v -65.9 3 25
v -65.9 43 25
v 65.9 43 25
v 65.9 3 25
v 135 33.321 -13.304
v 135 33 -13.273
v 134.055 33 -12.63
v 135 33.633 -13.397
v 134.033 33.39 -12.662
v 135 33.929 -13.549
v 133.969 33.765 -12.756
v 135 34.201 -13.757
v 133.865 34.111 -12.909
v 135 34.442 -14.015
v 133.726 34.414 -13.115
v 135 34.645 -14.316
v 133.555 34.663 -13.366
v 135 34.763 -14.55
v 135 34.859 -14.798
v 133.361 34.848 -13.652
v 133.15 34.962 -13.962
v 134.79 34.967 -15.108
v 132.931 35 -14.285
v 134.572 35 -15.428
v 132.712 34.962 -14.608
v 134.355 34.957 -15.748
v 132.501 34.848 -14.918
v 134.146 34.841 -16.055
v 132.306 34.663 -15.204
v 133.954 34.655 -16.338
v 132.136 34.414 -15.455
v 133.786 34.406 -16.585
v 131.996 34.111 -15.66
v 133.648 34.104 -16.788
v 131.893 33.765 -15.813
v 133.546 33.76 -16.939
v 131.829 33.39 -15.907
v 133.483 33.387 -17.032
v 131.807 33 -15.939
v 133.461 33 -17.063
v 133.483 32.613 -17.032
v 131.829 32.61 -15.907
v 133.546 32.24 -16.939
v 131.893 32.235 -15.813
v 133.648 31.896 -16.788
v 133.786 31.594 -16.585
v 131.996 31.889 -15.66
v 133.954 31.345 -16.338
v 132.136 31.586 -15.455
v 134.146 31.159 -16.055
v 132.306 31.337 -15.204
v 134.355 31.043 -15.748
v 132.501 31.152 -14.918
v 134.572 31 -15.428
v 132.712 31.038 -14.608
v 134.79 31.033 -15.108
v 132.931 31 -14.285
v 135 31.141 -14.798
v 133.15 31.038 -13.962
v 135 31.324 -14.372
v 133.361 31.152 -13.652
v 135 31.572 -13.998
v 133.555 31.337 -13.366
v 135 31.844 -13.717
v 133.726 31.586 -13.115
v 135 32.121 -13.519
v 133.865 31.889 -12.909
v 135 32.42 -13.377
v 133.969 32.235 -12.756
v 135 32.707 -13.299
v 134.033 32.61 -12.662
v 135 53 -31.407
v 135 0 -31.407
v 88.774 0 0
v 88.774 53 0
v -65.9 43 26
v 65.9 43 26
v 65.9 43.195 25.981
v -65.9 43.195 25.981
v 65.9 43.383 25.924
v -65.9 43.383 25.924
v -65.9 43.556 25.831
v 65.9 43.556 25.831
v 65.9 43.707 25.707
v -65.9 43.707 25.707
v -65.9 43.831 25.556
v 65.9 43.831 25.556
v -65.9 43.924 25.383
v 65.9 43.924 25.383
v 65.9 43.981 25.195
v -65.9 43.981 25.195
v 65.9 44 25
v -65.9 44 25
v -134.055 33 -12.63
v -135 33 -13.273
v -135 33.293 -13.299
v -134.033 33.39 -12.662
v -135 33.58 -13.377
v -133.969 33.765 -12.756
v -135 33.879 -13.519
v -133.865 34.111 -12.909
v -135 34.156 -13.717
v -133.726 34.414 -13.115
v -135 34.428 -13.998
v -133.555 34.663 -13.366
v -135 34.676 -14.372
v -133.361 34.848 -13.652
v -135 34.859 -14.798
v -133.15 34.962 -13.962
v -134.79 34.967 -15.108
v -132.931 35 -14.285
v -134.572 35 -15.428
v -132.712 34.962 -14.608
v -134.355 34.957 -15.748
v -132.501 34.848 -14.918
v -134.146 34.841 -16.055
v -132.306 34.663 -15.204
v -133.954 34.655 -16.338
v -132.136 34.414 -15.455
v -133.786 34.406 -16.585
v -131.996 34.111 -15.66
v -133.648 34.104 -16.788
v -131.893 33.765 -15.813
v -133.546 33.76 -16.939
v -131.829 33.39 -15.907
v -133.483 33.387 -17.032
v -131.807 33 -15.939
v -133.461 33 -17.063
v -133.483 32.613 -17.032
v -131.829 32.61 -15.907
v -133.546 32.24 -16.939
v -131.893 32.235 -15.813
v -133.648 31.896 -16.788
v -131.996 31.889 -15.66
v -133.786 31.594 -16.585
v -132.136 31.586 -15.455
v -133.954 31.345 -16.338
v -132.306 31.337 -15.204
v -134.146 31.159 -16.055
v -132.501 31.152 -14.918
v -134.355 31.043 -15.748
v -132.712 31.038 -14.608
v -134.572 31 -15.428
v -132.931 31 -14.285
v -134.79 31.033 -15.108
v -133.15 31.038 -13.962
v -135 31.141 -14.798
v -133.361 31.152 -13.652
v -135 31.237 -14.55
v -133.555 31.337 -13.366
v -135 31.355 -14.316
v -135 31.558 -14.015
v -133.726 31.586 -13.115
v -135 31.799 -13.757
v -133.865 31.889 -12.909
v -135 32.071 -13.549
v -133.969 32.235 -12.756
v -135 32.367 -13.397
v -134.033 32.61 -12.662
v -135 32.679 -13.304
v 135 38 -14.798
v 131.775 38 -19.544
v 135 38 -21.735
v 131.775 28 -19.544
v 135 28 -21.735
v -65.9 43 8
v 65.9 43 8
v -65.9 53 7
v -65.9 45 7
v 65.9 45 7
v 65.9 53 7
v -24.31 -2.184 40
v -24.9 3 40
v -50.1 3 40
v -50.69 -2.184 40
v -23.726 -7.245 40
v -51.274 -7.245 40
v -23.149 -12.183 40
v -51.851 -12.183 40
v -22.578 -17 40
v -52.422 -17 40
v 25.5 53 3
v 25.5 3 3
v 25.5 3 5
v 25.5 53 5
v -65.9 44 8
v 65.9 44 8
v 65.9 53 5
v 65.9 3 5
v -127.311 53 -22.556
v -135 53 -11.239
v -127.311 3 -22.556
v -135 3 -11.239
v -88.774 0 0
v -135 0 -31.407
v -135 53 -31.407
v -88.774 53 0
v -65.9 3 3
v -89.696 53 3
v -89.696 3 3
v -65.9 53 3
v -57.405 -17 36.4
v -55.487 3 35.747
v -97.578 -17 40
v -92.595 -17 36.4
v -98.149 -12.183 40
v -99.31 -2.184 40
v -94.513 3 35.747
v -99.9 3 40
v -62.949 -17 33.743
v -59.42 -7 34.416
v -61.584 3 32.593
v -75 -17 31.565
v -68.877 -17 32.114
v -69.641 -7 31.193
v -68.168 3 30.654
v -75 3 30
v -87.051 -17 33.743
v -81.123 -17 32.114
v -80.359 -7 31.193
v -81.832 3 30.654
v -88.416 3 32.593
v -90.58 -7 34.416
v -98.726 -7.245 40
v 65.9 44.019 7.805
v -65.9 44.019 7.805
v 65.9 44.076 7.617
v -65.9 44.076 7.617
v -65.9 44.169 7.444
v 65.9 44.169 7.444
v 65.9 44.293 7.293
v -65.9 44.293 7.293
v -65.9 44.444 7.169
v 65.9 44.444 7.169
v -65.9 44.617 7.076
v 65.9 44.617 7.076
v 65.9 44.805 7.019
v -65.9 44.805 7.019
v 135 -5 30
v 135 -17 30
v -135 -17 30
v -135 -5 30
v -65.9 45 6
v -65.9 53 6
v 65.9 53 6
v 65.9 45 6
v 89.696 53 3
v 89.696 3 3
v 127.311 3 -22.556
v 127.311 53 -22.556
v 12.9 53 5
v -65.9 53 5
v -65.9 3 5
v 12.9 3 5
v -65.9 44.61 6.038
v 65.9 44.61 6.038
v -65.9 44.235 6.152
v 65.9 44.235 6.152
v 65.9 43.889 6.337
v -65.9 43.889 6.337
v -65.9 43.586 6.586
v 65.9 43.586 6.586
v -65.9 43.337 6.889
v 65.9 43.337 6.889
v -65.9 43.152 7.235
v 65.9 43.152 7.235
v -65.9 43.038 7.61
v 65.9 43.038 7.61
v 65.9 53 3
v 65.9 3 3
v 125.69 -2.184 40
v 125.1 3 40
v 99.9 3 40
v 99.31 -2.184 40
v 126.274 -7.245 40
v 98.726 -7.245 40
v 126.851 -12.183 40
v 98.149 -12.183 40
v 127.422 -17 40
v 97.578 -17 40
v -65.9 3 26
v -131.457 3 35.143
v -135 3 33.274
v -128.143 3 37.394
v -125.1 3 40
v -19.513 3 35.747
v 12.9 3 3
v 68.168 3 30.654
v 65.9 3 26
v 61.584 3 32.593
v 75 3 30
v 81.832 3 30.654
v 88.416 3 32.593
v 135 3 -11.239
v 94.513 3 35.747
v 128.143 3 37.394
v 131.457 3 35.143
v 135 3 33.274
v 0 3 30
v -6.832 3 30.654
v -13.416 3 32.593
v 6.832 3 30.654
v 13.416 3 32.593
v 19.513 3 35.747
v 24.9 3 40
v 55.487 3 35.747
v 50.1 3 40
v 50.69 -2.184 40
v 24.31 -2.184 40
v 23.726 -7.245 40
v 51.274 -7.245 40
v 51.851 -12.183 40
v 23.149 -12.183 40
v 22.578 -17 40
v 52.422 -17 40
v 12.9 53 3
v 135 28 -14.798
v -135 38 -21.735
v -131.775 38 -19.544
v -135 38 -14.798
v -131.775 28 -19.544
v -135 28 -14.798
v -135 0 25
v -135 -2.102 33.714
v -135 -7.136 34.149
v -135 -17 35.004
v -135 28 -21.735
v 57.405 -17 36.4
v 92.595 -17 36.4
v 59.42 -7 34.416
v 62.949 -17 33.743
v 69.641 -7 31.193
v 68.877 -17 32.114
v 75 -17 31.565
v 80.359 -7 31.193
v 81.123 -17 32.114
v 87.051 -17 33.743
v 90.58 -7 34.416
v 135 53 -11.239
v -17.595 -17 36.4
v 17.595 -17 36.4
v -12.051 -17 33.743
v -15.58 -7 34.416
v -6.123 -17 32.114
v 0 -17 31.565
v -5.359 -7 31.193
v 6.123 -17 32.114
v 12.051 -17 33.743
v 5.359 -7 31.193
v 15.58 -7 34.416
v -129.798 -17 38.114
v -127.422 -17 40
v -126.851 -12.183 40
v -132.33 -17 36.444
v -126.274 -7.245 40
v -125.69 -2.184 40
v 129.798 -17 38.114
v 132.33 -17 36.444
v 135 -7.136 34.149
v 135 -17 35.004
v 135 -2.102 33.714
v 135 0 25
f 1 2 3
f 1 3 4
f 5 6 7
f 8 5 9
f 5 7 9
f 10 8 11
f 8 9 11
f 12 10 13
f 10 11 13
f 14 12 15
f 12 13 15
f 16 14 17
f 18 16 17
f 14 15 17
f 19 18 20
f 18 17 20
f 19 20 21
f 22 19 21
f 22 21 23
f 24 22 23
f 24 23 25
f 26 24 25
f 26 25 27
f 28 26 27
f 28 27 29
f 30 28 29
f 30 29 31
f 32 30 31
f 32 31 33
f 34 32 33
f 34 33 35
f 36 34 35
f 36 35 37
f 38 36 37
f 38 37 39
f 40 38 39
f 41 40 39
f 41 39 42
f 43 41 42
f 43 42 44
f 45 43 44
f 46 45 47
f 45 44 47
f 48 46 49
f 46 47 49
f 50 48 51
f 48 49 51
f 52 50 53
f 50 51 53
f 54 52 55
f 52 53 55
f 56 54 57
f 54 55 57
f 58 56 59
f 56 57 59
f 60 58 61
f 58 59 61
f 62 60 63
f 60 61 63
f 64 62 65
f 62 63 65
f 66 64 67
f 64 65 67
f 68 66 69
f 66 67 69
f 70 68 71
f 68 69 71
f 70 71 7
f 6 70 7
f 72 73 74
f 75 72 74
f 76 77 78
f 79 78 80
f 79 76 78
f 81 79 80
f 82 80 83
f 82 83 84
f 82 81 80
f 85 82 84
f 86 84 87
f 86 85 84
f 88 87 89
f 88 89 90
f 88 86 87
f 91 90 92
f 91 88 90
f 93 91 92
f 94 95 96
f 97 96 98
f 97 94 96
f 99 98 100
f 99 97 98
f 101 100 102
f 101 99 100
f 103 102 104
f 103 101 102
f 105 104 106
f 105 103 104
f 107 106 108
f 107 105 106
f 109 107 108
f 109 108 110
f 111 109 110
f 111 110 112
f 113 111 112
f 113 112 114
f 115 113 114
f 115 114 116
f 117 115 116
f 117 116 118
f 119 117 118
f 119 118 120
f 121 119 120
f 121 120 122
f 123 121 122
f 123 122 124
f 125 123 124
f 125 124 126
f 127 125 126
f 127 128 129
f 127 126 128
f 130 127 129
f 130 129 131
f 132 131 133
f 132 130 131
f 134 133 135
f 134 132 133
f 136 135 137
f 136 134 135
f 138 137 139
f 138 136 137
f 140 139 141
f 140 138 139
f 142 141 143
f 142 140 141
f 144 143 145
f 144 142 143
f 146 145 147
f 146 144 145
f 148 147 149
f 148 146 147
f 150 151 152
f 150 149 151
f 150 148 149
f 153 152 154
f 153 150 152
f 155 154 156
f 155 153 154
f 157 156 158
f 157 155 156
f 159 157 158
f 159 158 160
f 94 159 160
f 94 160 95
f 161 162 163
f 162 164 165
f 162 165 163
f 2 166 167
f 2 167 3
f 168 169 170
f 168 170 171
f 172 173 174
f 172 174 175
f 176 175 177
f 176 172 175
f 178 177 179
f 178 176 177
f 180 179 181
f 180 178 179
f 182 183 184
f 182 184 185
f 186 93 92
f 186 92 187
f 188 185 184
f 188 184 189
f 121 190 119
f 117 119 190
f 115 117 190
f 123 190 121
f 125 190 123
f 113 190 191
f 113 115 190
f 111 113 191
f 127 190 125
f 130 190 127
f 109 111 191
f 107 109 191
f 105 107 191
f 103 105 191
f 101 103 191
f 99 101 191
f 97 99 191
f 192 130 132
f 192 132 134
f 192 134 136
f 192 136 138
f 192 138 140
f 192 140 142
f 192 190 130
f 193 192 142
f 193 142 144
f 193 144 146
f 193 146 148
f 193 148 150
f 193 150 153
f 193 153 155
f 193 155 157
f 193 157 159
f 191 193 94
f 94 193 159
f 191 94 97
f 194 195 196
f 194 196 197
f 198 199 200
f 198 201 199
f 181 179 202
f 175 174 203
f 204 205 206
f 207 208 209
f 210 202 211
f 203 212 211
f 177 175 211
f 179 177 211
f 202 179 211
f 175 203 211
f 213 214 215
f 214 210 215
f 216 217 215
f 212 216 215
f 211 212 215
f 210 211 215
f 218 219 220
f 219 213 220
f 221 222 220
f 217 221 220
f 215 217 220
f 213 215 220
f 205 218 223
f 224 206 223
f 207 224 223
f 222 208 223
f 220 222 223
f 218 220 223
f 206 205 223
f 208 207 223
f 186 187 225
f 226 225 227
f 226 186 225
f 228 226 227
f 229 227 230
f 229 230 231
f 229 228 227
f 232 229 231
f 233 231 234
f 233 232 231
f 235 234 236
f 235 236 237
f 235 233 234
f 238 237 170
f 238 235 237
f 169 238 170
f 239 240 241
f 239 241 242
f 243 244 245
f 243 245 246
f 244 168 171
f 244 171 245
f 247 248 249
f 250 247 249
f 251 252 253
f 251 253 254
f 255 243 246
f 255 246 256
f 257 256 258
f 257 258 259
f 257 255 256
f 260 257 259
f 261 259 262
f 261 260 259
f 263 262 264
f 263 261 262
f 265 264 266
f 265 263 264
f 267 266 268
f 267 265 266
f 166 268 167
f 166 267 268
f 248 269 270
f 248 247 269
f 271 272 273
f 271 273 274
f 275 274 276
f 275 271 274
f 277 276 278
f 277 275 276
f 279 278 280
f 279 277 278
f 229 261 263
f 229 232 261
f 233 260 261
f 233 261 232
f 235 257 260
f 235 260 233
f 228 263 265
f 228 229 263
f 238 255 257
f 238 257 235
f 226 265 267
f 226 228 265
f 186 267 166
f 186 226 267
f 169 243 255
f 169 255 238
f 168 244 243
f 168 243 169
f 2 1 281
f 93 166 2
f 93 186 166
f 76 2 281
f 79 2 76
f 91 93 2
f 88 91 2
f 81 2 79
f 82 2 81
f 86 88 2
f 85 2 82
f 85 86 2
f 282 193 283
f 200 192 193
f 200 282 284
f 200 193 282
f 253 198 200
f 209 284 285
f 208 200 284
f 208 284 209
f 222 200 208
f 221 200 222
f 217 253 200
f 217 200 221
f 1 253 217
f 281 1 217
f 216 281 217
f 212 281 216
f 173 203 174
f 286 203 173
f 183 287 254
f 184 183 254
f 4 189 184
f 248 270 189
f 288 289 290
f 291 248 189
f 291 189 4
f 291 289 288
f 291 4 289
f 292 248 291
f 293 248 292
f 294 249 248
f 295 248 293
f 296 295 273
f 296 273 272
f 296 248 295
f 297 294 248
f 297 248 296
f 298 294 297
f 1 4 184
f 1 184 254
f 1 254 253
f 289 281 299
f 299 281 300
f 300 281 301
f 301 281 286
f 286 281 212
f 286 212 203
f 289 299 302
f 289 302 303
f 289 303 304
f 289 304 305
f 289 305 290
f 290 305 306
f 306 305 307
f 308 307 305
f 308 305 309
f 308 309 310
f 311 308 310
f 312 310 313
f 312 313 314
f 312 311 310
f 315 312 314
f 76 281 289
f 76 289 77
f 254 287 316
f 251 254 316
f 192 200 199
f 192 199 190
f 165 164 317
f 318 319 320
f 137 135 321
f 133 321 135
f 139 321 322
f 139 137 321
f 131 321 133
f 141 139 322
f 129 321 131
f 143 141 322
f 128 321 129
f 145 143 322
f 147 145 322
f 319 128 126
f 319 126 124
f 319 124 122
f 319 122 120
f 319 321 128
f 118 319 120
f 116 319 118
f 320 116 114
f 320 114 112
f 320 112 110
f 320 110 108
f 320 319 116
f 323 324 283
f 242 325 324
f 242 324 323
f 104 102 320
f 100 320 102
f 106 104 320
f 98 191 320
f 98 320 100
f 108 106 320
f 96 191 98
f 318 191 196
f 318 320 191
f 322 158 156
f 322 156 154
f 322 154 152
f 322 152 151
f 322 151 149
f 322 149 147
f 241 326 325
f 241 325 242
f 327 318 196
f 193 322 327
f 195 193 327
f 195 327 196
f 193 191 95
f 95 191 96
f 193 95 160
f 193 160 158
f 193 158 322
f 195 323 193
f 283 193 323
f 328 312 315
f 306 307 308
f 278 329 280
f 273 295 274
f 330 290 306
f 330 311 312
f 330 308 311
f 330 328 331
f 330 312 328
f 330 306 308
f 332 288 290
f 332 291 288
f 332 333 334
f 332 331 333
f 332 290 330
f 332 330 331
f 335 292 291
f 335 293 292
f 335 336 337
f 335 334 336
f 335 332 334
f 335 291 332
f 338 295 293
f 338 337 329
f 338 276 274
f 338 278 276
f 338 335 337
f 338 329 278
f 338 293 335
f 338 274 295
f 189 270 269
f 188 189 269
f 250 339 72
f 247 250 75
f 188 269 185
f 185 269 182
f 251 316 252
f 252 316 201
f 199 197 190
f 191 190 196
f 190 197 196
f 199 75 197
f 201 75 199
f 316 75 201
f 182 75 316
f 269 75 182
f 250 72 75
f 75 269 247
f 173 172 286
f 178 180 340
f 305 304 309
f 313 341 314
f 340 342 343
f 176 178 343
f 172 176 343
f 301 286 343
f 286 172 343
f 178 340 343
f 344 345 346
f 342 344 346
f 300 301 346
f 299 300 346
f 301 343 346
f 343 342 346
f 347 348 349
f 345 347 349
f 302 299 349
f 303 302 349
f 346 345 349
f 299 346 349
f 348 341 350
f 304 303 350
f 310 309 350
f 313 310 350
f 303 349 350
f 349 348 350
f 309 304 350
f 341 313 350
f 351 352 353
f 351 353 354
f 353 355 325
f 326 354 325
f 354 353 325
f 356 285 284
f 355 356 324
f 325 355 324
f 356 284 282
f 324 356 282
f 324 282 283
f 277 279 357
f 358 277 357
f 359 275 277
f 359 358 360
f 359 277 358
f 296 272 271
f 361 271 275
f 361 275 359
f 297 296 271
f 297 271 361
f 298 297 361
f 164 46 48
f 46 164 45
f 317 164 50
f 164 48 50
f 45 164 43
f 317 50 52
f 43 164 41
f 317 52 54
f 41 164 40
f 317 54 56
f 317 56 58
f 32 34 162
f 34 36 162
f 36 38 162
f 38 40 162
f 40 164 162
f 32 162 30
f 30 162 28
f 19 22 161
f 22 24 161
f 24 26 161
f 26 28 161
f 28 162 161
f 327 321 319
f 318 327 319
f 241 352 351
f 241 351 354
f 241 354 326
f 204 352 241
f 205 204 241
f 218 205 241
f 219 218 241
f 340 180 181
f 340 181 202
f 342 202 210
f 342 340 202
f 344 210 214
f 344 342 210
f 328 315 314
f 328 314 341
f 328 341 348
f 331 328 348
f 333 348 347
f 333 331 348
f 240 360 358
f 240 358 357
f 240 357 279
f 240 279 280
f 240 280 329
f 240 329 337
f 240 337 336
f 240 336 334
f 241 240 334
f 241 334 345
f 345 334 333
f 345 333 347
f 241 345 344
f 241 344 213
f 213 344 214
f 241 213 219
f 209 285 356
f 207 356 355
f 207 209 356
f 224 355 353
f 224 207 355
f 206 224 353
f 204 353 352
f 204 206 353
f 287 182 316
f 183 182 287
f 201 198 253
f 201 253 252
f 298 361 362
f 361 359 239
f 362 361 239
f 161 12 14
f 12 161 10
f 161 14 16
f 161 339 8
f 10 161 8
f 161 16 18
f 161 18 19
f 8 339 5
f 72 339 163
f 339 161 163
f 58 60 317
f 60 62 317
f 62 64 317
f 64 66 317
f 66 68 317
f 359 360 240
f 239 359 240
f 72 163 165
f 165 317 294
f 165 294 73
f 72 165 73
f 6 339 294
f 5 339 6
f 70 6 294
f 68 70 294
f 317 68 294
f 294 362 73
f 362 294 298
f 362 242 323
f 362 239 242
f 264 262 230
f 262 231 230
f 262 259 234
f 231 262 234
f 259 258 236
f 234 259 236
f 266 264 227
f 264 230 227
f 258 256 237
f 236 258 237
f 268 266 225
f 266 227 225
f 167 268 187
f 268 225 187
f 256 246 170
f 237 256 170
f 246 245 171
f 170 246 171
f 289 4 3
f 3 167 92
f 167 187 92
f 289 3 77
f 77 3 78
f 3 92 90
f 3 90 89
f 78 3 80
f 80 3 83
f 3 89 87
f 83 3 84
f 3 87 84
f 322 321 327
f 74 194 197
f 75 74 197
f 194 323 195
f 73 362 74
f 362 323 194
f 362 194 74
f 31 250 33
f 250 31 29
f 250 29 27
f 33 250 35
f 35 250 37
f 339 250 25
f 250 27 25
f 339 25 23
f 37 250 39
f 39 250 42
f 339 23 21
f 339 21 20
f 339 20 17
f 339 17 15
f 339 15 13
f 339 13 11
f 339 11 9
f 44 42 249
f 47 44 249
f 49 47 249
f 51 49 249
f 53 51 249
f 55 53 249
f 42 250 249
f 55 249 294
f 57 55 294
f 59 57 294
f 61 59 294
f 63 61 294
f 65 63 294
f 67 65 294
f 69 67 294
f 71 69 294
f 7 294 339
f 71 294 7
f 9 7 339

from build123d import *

# Parameters (mm, degrees)
BOSS_EXTRUDE1_DEPTH             = 135
BOSS_EXTRUDE2_REACH             = 151.416
BOSS_EXTRUDE2_DIRECTION_2_REACH = 151.416
CUT_EXTRUDE1_DEPTH              = 50
BOSS_EXTRUDE3_DEPTH             = 50
SKETCH9_R                       = 2
CUT_EXTRUDE2_DEPTH              = 262.164206304
CUT_EXTRUDE3_START              = -2
SKETCH10_W                      = 8.681737756
SKETCH10_H                      = 10
CUT_EXTRUDE3_DEPTH              = 260.164206304
SKETCH11_W                      = 78.8
SKETCH11_H                      = 50
SKETCH11_W_2                    = 40.4
BOSS_EXTRUDE4_DEPTH             = 2
BOSS_EXTRUDE5_DEPTH             = 131.8


with BuildPart() as part:
    # Sketch1 → Boss-Extrude1 (new, symmetric)
    with BuildSketch(Plane(origin=(0, 0, 0), x_dir=(0, 0, -1), z_dir=(1, 0, 0))):
        Polygon((0, 0), (0, 53), (-3, 53), (-3, 3), (-40, 3), (-40, 0), (-40, -17), (-30, -17), (-30, -5), (-25, 0), align=None)
    extrude(amount=BOSS_EXTRUDE1_DEPTH, both=True)

    # Sketch2 → Cut-Revolve1 (revolve, cut)
    with BuildSketch(Plane(origin=(0, 0, 0), x_dir=(0, 0, -1), z_dir=(1, 0, 0))):
        Polygon((-66, 3), (-30, 3), (-39, -112), (-66, -112), align=None)
    revolve(axis=Axis((0, 3, 66), (0, -1, 0)), mode=Mode.SUBTRACT)

    # Sketch3 → Cut-Revolve2 (revolve, cut)
    with BuildSketch(Plane(origin=(75, 0, 0), x_dir=(0, 0, -1), z_dir=(1, 0, 0))):
        Polygon((-30, 3), (-66, 3), (-66, -112), (-39, -112), align=None)
    cut_revolve2 = revolve(axis=Axis((75, 3, 66), (0, -1, 0)), mode=Mode.SUBTRACT)

    # Sketch4 → Cut-Revolve3 (revolve, cut)
    with BuildSketch(Plane(origin=(150, 0, 0), x_dir=(0, 0, -1), z_dir=(1, 0, 0))):
        Polygon((-30, 3), (-66, 3), (-66, -112), (-39, -112), align=None)
    cut_revolve3 = revolve(axis=Axis((150, 3, 66), (0, -1, 0)), mode=Mode.SUBTRACT)

    # Boss-Extrude2: up to this face of the body (flat: up to its plane)
    boss_extrude2_end = Plane(part.part.faces().sort_by_distance((0, 53, 1.5))[0])
    # Sketch5 → Boss-Extrude2 (add, up to the picked face)
    with BuildSketch(Plane(origin=(0, 3, 0), x_dir=(1, 0, 0), z_dir=(0, 1, 0)), mode=Mode.PRIVATE) as boss_extrude2_sk1:
        Polygon((89.696341704, -3), (135, -3), (135, 27.780279129), (135, 31.407195461), (84.358099725, -3), align=None)
    boss_extrude2_tool1 = split(extrude(boss_extrude2_sk1.sketch, amount=BOSS_EXTRUDE2_REACH, mode=Mode.PRIVATE), bisect_by=boss_extrude2_end, keep=Keep.BOTH, mode=Mode.PRIVATE)
    boss_extrude2 = boss_extrude2_tool1.solids().sort_by(Axis((118.119367, 3, -8.469065), (0, 1, 0)))[0]
    add(boss_extrude2)

    # Boss-Extrude2 direction 2: up to this face of the body (flat: up to its plane)
    boss_extrude2_direction_2_end = Plane(part.part.faces().sort_by_distance((0, 0, 12.5))[0])
    # Sketch5 → Boss-Extrude2 direction 2 (add, up to the picked face)
    with BuildSketch(Plane(origin=(0, 3, 0), x_dir=(1, 0, 0), z_dir=(0, 1, 0)), mode=Mode.PRIVATE) as boss_extrude2_direction_2_sk1:
        Polygon((89.696341704, -3), (135, -3), (135, 27.780279129), (135, 31.407195461), (84.358099725, -3), align=None)
    boss_extrude2_direction_2_tool1 = split(extrude(boss_extrude2_direction_2_sk1.sketch, amount=-BOSS_EXTRUDE2_DIRECTION_2_REACH, mode=Mode.PRIVATE), bisect_by=boss_extrude2_direction_2_end, keep=Keep.BOTH, mode=Mode.PRIVATE)
    boss_extrude2_direction_2 = boss_extrude2_direction_2_tool1.solids().sort_by(Axis((118.119367, 3, -8.469065), (0, -1, 0)))[0]
    add(boss_extrude2_direction_2)

    # Sketch7 → Cut-Extrude1 (cut)
    with BuildSketch(Plane(origin=(0, 3, 0), x_dir=(1, 0, 0), z_dir=(0, 1, 0))):
        Polygon((89.696341704, -3), (135, 27.780279129), (135, -3), align=None)
    cut_extrude1 = extrude(amount=CUT_EXTRUDE1_DEPTH, mode=Mode.SUBTRACT)

    # Sketch8 → Boss-Extrude3 (add)
    with BuildSketch(Plane(origin=(0, 3, 0), x_dir=(1, 0, 0), z_dir=(0, 1, 0))):
        Polygon((135, 27.780279129), (127.311099154, 22.556274642), (135, 11.239439757), align=None)
    boss_extrude3 = extrude(amount=BOSS_EXTRUDE3_DEPTH)

    # Sketch9 → Cut-Extrude2 (cut, through all)
    with BuildSketch(Plane(origin=(97.588254801, 0, -66.303557715), x_dir=(0.5619827673392628, 0, 0.8271489401635621), z_dir=(-0.8271489401635621, 0, 0.5619827673392628))):
        with Locations((62.889245152, 33)):
            Circle(SKETCH9_R)
    cut_extrude2 = extrude(amount=-CUT_EXTRUDE2_DEPTH, mode=Mode.SUBTRACT)

    # Sketch10 → Cut-Extrude3 (cut, through all)
    with BuildSketch(Plane(origin=(97.588254801, 0, -66.303557715), x_dir=(0.5619827673392628, 0, 0.8271489401635621), z_dir=(-0.8271489401635621, 0, 0.5619827673392628)).offset(CUT_EXTRUDE3_START)):
        with Locations((62.23011403, 33)):
            Rectangle(SKETCH10_W, SKETCH10_H)
    cut_extrude3 = extrude(amount=-CUT_EXTRUDE3_DEPTH, mode=Mode.SUBTRACT)

    # Mirror1: Cut-Revolve2, Cut-Revolve3, Boss-Extrude2, Boss-Extrude2 direction 2, Cut-Extrude1, Boss-Extrude3, Cut-Extrude2, Cut-Extrude3 across plane
    add(cut_revolve2.mirror(Plane(origin=(0, 0, 0), x_dir=(0, 0, 1), z_dir=(1, 0, 0))), mode=Mode.SUBTRACT)
    add(cut_revolve3.mirror(Plane(origin=(0, 0, 0), x_dir=(0, 0, 1), z_dir=(1, 0, 0))), mode=Mode.SUBTRACT)
    add(boss_extrude2.mirror(Plane(origin=(0, 0, 0), x_dir=(0, 0, 1), z_dir=(1, 0, 0))))
    add(boss_extrude2_direction_2.mirror(Plane(origin=(0, 0, 0), x_dir=(0, 0, 1), z_dir=(1, 0, 0))))
    add(cut_extrude1.mirror(Plane(origin=(0, 0, 0), x_dir=(0, 0, 1), z_dir=(1, 0, 0))), mode=Mode.SUBTRACT)
    add(boss_extrude3.mirror(Plane(origin=(0, 0, 0), x_dir=(0, 0, 1), z_dir=(1, 0, 0))))
    add(cut_extrude2.mirror(Plane(origin=(0, 0, 0), x_dir=(0, 0, 1), z_dir=(1, 0, 0))), mode=Mode.SUBTRACT)
    add(cut_extrude3.mirror(Plane(origin=(0, 0, 0), x_dir=(0, 0, 1), z_dir=(1, 0, 0))), mode=Mode.SUBTRACT)

    # Sketch11 → Boss-Extrude4 (add)
    with BuildSketch(Plane.XY.offset(3)):
        with Locations((-26.5, 28)):
            Rectangle(SKETCH11_W, SKETCH11_H)
        with Locations((45.7, 28)):
            Rectangle(SKETCH11_W_2, SKETCH11_H)
    extrude(amount=BOSS_EXTRUDE4_DEPTH)

    # Sketch12 → Boss-Extrude5 (add)
    with BuildSketch(Plane.ZY.offset(65.9)):
        with BuildLine():
            Line((6, 53), (6, 45))
            ThreePointArc((6, 45), (6.585786438, 43.585786438), (8, 43))
            Line((8, 43), (25, 43))
            Line((25, 43), (25, 3))
            Line((25, 3), (26, 3))
            Line((26, 3), (26, 43))
            ThreePointArc((26, 43), (25.707106781, 43.707106781), (25, 44))
            Line((25, 44), (8, 44))
            ThreePointArc((8, 44), (7.292893219, 44.292893219), (7, 45))
            Line((7, 45), (7, 53))
            Line((7, 53), (6, 53))
        make_face()
    extrude(amount=-BOSS_EXTRUDE5_DEPTH)


solid = part.part
